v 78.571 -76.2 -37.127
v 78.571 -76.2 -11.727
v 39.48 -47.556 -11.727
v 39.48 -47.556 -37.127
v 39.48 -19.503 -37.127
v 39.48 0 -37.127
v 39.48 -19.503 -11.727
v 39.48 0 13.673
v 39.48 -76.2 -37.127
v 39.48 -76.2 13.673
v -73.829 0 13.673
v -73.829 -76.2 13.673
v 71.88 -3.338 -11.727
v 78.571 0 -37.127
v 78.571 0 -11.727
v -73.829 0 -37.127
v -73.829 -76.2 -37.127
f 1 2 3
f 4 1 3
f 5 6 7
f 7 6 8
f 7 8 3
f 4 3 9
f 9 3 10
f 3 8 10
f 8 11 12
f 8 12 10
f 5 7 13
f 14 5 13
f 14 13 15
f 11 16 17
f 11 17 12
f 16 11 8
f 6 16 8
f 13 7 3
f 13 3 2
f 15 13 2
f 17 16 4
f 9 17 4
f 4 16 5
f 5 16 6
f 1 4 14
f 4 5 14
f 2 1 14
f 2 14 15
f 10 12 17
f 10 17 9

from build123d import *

# Parameters (mm, degrees)
F0_W     = 152.4
F0_H     = 50.8
F1_DEPTH = 76.2
F3_DEPTH = 50.801
F4_W     = 48.462587264
F4_H     = 25.4
F5_DEPTH = 61.4661735057
F8_DEPTH = 25.4


with BuildPart() as f1:
    # F0 (on Front) → F1 (new body)
    with BuildSketch(Plane.XZ):
        with Locations((2.3709694028, -11.726943469)):
            Rectangle(F0_W, F0_H)
    extrude(amount=F1_DEPTH)

    # F2 (on face) → F3 (cut, through all)
    with BuildSketch(Plane.XY.offset(13.673056531)):
        Polygon((39.4796133041, -76.2), (78.5709694028, -76.2), (39.4796133041, -47.5558340549), align=None)
        Polygon((39.4796133041, 0), (39.4796133041, -19.5033811033), (78.5709694028, 0), align=None)
    extrude(amount=-F3_DEPTH, mode=Mode.SUBTRACT)

    # F4 (on face) → F5 (cut, through all)
    with BuildSketch(Plane(origin=(-8.8807709948, -12.1197936799, 0), x_dir=(0.8066295736, -0.5910572993, 0), z_dir=(-0.5910572993, -0.8066295736, 0))):
        with Locations((84.1849401183, 0.973056531)):
            Rectangle(F4_W, F4_H)
    extrude(amount=-F5_DEPTH, mode=Mode.SUBTRACT)

    # F7 (on face) → F8 (cut)
    with BuildSketch(Plane.XY.offset(13.673056531)):
        Polygon((39.4796133041, -19.5033811033), (39.4796133041, -47.5558340549), (71.8800364079, -3.338226891), align=None)
        Polygon((71.8800364079, -3.338226891), (39.4796133041, -47.5558340549), (60.0389204919, -83.1656008959), (93.497350812, -40.1085205376), align=None)
    extrude(amount=-F8_DEPTH, mode=Mode.SUBTRACT)


solid = f1.part
